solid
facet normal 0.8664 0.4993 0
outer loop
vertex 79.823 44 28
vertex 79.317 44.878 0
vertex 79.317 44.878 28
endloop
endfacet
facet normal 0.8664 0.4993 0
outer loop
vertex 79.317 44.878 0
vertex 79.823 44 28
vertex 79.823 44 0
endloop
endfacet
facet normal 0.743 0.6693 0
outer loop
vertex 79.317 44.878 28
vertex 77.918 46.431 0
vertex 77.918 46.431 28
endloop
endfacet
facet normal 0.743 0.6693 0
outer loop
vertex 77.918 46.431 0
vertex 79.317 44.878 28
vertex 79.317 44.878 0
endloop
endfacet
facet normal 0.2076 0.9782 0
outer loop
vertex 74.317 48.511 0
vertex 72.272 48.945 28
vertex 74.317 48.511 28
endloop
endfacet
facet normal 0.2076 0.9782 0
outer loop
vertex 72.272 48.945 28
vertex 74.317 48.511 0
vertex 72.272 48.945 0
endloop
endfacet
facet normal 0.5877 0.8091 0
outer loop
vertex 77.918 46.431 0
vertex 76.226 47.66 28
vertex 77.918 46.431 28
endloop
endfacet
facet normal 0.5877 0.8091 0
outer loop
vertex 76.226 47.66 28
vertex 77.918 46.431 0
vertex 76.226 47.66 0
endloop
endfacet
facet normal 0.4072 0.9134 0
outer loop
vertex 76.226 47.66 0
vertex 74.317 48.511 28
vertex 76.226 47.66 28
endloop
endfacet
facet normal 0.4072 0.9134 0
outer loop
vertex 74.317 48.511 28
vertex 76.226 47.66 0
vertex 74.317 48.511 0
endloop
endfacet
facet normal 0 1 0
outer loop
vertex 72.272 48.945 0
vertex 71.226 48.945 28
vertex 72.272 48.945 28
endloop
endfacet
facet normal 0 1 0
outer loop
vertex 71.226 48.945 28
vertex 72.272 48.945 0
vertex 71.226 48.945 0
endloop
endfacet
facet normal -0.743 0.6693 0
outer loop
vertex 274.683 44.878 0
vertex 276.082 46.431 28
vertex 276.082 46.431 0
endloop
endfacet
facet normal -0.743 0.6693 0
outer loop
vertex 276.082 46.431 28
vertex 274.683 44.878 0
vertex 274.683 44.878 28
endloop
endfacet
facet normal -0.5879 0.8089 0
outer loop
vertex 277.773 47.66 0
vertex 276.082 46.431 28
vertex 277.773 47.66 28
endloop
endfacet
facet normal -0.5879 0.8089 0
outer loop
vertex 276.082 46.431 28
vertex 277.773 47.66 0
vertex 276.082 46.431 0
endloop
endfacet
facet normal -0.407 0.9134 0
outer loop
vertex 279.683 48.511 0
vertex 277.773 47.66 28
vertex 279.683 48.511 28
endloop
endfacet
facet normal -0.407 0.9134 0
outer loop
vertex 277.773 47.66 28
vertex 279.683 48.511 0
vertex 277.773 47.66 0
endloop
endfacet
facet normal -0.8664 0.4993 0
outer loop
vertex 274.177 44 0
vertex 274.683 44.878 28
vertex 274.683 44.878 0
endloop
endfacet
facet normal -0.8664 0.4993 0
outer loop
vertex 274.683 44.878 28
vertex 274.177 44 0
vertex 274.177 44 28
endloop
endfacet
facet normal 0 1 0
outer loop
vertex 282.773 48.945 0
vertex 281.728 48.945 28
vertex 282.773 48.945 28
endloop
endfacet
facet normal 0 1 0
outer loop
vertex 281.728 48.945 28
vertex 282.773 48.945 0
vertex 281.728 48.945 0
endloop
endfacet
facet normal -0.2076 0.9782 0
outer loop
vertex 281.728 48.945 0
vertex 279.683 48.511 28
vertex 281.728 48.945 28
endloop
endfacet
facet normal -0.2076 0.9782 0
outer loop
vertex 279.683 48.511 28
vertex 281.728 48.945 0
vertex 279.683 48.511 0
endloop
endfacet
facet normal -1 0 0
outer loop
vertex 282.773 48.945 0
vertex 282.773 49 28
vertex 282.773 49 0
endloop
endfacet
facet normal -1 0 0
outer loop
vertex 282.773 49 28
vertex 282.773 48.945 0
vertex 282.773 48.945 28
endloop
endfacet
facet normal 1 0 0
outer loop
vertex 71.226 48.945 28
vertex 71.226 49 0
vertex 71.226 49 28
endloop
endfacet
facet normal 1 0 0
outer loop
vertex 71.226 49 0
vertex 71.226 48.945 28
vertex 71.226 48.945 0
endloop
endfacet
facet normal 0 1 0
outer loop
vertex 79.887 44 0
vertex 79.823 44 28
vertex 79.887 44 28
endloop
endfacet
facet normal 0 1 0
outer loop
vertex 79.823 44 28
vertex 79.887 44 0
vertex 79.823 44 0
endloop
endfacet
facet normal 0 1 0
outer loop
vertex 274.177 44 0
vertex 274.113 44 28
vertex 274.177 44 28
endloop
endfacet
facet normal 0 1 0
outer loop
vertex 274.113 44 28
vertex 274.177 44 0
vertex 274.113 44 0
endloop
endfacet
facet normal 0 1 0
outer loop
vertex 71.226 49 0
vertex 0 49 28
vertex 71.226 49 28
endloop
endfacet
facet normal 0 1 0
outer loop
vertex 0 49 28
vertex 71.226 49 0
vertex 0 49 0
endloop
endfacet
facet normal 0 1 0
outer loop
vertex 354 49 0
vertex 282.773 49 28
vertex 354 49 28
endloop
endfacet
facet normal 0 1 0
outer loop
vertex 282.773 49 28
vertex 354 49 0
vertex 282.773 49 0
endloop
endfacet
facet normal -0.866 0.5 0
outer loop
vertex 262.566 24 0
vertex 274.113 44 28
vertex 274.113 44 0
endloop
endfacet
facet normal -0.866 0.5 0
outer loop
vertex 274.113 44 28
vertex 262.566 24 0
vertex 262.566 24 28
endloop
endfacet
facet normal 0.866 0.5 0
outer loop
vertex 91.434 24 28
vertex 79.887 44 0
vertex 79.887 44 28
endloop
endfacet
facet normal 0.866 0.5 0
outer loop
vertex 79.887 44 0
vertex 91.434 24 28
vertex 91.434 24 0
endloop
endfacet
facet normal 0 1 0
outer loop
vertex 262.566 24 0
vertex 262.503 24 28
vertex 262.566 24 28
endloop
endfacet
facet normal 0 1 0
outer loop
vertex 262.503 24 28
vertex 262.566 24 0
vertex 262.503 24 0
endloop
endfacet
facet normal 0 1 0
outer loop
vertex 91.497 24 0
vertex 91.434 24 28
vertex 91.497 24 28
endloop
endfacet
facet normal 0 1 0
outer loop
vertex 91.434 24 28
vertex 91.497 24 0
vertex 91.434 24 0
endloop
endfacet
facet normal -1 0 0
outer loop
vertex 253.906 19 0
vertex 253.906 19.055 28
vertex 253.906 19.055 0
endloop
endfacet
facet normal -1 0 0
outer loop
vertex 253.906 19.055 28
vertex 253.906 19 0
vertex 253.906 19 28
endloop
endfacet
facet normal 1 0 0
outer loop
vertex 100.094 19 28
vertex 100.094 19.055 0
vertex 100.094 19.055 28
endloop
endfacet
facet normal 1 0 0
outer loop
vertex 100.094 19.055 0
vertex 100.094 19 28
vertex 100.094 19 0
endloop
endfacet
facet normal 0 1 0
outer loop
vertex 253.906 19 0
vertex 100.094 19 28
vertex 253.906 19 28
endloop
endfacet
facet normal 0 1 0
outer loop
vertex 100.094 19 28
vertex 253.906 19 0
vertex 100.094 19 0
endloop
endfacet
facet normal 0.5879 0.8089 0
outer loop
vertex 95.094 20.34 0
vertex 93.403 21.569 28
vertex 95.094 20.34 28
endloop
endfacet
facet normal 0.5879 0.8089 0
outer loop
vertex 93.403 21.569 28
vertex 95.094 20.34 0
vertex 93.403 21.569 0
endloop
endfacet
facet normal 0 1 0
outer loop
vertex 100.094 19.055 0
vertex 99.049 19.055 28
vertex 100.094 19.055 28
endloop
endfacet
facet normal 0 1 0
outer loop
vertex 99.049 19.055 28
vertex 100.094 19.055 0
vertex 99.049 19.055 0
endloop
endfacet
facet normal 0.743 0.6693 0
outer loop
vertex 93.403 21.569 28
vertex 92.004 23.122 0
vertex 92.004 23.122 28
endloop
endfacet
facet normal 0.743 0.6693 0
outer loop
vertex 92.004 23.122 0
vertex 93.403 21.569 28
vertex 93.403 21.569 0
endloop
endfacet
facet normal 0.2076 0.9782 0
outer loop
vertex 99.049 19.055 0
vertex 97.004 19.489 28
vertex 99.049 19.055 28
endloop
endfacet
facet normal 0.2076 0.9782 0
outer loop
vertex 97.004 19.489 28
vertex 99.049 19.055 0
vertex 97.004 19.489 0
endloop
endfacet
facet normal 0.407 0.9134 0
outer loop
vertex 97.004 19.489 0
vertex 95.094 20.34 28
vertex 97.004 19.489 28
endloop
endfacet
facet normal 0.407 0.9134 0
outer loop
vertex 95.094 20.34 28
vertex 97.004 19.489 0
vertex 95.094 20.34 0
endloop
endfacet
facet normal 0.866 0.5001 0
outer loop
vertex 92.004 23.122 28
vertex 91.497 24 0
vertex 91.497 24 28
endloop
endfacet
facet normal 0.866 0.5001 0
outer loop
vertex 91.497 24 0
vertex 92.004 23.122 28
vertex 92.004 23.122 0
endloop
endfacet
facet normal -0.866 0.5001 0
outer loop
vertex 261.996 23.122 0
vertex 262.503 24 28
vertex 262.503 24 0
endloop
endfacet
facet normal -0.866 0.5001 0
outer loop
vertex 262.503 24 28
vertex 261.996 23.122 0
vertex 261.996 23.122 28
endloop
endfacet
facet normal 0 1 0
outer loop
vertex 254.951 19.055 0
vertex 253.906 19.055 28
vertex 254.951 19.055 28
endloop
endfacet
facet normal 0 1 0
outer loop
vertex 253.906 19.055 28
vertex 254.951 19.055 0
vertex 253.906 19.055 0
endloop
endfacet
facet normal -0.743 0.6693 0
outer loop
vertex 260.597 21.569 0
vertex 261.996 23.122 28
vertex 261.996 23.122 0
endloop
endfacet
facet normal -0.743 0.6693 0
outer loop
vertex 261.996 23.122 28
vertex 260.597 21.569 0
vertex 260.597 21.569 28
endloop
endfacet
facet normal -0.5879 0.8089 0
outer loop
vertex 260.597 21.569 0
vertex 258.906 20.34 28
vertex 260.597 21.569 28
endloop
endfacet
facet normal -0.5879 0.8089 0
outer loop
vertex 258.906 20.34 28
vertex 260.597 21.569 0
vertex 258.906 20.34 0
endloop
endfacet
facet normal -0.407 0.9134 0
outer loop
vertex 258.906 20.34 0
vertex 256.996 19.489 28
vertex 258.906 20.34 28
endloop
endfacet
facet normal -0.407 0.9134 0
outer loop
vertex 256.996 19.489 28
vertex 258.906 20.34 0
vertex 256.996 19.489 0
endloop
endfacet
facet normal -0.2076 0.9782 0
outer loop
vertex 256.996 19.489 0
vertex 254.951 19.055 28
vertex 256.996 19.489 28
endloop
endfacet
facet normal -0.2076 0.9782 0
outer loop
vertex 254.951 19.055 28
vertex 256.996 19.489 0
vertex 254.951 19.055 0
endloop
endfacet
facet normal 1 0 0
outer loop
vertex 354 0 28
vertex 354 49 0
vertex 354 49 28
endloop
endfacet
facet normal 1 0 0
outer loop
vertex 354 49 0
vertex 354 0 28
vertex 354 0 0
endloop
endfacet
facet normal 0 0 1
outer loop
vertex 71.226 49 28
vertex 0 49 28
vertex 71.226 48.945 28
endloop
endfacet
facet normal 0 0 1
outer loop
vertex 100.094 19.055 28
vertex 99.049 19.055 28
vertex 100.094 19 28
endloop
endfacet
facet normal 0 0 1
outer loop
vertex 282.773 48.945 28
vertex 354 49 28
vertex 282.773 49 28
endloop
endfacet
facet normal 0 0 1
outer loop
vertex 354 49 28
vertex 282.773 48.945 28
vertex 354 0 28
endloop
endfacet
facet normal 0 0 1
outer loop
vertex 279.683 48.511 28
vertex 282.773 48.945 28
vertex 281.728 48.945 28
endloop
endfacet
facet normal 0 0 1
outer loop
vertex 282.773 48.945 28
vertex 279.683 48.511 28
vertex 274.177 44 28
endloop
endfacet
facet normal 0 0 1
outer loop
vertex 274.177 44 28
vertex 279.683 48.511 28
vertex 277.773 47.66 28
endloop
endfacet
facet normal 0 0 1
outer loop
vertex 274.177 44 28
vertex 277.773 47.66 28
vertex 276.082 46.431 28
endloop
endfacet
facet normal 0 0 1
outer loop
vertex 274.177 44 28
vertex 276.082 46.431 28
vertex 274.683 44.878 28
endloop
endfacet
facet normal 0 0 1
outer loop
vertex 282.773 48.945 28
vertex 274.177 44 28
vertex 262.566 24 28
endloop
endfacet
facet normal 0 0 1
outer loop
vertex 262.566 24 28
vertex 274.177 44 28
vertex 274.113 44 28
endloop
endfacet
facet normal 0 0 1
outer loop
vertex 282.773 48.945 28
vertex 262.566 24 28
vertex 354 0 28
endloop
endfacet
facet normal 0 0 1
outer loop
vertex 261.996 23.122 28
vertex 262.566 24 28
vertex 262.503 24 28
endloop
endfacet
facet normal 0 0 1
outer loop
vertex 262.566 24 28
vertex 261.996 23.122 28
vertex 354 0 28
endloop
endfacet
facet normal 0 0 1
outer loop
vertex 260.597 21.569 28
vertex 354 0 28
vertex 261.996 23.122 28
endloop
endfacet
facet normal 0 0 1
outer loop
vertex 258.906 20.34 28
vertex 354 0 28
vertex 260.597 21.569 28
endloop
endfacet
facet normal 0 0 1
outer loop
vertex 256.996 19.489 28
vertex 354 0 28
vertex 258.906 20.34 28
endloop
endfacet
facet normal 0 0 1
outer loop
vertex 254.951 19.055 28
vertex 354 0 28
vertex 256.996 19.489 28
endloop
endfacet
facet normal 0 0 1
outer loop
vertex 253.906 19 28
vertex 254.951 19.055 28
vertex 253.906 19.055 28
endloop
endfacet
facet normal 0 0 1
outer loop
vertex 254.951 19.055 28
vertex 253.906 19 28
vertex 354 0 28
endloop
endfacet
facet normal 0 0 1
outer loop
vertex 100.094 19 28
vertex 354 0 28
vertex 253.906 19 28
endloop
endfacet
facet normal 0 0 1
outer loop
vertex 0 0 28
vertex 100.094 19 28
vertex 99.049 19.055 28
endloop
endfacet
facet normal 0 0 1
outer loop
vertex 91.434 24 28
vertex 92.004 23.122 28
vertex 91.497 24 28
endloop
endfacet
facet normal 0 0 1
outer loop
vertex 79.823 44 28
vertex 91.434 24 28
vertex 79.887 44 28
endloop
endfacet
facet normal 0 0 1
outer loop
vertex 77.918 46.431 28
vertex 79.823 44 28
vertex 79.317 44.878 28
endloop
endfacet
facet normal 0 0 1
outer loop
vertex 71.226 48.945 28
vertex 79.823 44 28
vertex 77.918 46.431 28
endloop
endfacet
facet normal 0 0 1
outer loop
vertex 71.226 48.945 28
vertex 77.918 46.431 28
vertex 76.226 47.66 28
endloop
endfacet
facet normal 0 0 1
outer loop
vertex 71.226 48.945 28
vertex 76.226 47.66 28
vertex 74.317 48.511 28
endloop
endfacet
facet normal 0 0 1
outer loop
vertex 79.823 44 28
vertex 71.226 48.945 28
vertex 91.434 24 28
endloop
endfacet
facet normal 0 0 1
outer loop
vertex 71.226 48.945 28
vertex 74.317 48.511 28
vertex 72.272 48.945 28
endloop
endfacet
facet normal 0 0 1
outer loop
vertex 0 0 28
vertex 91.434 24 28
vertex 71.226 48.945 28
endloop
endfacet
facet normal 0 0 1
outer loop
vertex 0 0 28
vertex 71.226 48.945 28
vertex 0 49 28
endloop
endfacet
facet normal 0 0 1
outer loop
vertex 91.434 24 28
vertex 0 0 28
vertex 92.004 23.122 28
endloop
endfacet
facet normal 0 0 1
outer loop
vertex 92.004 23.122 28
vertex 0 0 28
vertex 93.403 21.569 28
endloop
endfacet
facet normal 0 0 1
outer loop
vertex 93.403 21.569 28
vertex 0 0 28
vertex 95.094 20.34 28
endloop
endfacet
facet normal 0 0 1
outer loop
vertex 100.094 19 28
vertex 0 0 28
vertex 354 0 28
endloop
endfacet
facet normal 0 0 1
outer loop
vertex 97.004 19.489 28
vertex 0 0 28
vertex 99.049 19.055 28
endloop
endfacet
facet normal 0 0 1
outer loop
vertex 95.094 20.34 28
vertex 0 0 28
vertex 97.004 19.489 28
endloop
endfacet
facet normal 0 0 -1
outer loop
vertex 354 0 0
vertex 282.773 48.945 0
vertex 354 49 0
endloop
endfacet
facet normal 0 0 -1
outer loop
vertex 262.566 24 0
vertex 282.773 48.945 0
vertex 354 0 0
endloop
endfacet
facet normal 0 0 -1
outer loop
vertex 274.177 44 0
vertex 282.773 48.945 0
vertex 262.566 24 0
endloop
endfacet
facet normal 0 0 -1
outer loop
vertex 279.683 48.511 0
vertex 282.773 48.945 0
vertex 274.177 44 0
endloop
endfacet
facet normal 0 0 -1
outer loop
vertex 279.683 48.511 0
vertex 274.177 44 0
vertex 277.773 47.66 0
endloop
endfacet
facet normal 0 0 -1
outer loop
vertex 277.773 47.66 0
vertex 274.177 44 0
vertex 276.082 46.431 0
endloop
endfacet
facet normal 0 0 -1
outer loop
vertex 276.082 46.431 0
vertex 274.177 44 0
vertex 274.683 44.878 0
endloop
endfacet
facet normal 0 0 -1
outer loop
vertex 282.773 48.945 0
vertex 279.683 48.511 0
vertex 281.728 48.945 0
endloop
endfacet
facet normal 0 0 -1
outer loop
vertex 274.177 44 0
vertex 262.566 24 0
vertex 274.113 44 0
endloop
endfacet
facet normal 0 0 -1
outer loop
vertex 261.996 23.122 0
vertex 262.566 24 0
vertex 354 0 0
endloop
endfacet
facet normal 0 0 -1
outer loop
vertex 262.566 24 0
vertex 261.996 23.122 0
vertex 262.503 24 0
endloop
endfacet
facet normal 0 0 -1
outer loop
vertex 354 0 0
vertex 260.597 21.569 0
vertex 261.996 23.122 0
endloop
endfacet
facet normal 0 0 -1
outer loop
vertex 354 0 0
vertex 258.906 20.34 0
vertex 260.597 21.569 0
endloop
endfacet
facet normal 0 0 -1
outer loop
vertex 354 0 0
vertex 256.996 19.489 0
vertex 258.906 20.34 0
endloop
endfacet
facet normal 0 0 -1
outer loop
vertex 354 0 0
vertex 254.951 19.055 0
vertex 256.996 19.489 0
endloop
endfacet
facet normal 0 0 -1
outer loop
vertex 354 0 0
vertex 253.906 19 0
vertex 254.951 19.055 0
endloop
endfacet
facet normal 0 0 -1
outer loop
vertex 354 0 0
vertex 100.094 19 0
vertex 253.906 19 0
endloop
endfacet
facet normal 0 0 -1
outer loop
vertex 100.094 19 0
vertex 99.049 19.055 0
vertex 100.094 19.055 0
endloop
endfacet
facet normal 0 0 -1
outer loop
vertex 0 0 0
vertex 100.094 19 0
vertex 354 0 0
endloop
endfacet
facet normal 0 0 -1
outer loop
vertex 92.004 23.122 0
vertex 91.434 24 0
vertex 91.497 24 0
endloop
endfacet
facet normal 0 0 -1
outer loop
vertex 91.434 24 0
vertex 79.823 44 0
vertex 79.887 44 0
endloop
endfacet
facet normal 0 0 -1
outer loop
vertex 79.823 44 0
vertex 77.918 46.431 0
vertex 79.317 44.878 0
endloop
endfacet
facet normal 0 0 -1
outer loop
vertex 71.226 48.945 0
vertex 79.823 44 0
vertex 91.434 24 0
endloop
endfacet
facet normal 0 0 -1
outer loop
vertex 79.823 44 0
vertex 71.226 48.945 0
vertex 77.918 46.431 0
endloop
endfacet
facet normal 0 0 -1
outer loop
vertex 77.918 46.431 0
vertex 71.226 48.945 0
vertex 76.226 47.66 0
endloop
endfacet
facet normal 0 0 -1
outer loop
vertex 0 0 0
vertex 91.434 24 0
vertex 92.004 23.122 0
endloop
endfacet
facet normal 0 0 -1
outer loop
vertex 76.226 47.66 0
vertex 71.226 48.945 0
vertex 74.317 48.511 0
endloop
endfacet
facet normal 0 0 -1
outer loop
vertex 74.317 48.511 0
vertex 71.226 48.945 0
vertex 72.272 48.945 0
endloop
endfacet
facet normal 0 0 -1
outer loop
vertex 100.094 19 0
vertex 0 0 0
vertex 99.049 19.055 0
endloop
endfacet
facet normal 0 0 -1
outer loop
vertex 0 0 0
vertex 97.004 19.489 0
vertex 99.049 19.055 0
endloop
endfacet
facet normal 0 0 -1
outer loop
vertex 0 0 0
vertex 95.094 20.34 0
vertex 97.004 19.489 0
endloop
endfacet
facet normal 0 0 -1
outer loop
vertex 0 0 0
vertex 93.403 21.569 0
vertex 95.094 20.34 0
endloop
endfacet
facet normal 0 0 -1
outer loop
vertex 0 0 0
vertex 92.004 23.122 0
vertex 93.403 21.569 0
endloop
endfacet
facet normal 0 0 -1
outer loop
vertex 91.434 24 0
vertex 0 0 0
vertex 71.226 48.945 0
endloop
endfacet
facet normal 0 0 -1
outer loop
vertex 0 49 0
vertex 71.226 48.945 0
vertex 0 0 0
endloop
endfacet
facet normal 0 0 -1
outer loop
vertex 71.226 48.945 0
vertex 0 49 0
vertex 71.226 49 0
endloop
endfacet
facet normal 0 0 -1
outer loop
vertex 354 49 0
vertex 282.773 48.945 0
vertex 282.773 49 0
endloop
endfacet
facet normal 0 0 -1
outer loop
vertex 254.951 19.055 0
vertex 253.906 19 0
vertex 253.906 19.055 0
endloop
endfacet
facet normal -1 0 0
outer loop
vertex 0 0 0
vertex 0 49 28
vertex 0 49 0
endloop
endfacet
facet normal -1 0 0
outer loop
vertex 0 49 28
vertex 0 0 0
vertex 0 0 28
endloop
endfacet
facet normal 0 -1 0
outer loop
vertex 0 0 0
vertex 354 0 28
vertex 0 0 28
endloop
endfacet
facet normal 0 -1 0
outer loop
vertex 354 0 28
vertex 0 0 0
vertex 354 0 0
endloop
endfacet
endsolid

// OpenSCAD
include <../src/wardrobe.scad>;
plank_yz_middle_bottom();
//github_openscad -o wardrobe_3/plank_yz_middle_bottom.stl -D wardrobe_n=3 -D cutting_edge=0 -D break_view_length=0 wardrobe_3/plank_yz_middle_bottom_stl.scad
